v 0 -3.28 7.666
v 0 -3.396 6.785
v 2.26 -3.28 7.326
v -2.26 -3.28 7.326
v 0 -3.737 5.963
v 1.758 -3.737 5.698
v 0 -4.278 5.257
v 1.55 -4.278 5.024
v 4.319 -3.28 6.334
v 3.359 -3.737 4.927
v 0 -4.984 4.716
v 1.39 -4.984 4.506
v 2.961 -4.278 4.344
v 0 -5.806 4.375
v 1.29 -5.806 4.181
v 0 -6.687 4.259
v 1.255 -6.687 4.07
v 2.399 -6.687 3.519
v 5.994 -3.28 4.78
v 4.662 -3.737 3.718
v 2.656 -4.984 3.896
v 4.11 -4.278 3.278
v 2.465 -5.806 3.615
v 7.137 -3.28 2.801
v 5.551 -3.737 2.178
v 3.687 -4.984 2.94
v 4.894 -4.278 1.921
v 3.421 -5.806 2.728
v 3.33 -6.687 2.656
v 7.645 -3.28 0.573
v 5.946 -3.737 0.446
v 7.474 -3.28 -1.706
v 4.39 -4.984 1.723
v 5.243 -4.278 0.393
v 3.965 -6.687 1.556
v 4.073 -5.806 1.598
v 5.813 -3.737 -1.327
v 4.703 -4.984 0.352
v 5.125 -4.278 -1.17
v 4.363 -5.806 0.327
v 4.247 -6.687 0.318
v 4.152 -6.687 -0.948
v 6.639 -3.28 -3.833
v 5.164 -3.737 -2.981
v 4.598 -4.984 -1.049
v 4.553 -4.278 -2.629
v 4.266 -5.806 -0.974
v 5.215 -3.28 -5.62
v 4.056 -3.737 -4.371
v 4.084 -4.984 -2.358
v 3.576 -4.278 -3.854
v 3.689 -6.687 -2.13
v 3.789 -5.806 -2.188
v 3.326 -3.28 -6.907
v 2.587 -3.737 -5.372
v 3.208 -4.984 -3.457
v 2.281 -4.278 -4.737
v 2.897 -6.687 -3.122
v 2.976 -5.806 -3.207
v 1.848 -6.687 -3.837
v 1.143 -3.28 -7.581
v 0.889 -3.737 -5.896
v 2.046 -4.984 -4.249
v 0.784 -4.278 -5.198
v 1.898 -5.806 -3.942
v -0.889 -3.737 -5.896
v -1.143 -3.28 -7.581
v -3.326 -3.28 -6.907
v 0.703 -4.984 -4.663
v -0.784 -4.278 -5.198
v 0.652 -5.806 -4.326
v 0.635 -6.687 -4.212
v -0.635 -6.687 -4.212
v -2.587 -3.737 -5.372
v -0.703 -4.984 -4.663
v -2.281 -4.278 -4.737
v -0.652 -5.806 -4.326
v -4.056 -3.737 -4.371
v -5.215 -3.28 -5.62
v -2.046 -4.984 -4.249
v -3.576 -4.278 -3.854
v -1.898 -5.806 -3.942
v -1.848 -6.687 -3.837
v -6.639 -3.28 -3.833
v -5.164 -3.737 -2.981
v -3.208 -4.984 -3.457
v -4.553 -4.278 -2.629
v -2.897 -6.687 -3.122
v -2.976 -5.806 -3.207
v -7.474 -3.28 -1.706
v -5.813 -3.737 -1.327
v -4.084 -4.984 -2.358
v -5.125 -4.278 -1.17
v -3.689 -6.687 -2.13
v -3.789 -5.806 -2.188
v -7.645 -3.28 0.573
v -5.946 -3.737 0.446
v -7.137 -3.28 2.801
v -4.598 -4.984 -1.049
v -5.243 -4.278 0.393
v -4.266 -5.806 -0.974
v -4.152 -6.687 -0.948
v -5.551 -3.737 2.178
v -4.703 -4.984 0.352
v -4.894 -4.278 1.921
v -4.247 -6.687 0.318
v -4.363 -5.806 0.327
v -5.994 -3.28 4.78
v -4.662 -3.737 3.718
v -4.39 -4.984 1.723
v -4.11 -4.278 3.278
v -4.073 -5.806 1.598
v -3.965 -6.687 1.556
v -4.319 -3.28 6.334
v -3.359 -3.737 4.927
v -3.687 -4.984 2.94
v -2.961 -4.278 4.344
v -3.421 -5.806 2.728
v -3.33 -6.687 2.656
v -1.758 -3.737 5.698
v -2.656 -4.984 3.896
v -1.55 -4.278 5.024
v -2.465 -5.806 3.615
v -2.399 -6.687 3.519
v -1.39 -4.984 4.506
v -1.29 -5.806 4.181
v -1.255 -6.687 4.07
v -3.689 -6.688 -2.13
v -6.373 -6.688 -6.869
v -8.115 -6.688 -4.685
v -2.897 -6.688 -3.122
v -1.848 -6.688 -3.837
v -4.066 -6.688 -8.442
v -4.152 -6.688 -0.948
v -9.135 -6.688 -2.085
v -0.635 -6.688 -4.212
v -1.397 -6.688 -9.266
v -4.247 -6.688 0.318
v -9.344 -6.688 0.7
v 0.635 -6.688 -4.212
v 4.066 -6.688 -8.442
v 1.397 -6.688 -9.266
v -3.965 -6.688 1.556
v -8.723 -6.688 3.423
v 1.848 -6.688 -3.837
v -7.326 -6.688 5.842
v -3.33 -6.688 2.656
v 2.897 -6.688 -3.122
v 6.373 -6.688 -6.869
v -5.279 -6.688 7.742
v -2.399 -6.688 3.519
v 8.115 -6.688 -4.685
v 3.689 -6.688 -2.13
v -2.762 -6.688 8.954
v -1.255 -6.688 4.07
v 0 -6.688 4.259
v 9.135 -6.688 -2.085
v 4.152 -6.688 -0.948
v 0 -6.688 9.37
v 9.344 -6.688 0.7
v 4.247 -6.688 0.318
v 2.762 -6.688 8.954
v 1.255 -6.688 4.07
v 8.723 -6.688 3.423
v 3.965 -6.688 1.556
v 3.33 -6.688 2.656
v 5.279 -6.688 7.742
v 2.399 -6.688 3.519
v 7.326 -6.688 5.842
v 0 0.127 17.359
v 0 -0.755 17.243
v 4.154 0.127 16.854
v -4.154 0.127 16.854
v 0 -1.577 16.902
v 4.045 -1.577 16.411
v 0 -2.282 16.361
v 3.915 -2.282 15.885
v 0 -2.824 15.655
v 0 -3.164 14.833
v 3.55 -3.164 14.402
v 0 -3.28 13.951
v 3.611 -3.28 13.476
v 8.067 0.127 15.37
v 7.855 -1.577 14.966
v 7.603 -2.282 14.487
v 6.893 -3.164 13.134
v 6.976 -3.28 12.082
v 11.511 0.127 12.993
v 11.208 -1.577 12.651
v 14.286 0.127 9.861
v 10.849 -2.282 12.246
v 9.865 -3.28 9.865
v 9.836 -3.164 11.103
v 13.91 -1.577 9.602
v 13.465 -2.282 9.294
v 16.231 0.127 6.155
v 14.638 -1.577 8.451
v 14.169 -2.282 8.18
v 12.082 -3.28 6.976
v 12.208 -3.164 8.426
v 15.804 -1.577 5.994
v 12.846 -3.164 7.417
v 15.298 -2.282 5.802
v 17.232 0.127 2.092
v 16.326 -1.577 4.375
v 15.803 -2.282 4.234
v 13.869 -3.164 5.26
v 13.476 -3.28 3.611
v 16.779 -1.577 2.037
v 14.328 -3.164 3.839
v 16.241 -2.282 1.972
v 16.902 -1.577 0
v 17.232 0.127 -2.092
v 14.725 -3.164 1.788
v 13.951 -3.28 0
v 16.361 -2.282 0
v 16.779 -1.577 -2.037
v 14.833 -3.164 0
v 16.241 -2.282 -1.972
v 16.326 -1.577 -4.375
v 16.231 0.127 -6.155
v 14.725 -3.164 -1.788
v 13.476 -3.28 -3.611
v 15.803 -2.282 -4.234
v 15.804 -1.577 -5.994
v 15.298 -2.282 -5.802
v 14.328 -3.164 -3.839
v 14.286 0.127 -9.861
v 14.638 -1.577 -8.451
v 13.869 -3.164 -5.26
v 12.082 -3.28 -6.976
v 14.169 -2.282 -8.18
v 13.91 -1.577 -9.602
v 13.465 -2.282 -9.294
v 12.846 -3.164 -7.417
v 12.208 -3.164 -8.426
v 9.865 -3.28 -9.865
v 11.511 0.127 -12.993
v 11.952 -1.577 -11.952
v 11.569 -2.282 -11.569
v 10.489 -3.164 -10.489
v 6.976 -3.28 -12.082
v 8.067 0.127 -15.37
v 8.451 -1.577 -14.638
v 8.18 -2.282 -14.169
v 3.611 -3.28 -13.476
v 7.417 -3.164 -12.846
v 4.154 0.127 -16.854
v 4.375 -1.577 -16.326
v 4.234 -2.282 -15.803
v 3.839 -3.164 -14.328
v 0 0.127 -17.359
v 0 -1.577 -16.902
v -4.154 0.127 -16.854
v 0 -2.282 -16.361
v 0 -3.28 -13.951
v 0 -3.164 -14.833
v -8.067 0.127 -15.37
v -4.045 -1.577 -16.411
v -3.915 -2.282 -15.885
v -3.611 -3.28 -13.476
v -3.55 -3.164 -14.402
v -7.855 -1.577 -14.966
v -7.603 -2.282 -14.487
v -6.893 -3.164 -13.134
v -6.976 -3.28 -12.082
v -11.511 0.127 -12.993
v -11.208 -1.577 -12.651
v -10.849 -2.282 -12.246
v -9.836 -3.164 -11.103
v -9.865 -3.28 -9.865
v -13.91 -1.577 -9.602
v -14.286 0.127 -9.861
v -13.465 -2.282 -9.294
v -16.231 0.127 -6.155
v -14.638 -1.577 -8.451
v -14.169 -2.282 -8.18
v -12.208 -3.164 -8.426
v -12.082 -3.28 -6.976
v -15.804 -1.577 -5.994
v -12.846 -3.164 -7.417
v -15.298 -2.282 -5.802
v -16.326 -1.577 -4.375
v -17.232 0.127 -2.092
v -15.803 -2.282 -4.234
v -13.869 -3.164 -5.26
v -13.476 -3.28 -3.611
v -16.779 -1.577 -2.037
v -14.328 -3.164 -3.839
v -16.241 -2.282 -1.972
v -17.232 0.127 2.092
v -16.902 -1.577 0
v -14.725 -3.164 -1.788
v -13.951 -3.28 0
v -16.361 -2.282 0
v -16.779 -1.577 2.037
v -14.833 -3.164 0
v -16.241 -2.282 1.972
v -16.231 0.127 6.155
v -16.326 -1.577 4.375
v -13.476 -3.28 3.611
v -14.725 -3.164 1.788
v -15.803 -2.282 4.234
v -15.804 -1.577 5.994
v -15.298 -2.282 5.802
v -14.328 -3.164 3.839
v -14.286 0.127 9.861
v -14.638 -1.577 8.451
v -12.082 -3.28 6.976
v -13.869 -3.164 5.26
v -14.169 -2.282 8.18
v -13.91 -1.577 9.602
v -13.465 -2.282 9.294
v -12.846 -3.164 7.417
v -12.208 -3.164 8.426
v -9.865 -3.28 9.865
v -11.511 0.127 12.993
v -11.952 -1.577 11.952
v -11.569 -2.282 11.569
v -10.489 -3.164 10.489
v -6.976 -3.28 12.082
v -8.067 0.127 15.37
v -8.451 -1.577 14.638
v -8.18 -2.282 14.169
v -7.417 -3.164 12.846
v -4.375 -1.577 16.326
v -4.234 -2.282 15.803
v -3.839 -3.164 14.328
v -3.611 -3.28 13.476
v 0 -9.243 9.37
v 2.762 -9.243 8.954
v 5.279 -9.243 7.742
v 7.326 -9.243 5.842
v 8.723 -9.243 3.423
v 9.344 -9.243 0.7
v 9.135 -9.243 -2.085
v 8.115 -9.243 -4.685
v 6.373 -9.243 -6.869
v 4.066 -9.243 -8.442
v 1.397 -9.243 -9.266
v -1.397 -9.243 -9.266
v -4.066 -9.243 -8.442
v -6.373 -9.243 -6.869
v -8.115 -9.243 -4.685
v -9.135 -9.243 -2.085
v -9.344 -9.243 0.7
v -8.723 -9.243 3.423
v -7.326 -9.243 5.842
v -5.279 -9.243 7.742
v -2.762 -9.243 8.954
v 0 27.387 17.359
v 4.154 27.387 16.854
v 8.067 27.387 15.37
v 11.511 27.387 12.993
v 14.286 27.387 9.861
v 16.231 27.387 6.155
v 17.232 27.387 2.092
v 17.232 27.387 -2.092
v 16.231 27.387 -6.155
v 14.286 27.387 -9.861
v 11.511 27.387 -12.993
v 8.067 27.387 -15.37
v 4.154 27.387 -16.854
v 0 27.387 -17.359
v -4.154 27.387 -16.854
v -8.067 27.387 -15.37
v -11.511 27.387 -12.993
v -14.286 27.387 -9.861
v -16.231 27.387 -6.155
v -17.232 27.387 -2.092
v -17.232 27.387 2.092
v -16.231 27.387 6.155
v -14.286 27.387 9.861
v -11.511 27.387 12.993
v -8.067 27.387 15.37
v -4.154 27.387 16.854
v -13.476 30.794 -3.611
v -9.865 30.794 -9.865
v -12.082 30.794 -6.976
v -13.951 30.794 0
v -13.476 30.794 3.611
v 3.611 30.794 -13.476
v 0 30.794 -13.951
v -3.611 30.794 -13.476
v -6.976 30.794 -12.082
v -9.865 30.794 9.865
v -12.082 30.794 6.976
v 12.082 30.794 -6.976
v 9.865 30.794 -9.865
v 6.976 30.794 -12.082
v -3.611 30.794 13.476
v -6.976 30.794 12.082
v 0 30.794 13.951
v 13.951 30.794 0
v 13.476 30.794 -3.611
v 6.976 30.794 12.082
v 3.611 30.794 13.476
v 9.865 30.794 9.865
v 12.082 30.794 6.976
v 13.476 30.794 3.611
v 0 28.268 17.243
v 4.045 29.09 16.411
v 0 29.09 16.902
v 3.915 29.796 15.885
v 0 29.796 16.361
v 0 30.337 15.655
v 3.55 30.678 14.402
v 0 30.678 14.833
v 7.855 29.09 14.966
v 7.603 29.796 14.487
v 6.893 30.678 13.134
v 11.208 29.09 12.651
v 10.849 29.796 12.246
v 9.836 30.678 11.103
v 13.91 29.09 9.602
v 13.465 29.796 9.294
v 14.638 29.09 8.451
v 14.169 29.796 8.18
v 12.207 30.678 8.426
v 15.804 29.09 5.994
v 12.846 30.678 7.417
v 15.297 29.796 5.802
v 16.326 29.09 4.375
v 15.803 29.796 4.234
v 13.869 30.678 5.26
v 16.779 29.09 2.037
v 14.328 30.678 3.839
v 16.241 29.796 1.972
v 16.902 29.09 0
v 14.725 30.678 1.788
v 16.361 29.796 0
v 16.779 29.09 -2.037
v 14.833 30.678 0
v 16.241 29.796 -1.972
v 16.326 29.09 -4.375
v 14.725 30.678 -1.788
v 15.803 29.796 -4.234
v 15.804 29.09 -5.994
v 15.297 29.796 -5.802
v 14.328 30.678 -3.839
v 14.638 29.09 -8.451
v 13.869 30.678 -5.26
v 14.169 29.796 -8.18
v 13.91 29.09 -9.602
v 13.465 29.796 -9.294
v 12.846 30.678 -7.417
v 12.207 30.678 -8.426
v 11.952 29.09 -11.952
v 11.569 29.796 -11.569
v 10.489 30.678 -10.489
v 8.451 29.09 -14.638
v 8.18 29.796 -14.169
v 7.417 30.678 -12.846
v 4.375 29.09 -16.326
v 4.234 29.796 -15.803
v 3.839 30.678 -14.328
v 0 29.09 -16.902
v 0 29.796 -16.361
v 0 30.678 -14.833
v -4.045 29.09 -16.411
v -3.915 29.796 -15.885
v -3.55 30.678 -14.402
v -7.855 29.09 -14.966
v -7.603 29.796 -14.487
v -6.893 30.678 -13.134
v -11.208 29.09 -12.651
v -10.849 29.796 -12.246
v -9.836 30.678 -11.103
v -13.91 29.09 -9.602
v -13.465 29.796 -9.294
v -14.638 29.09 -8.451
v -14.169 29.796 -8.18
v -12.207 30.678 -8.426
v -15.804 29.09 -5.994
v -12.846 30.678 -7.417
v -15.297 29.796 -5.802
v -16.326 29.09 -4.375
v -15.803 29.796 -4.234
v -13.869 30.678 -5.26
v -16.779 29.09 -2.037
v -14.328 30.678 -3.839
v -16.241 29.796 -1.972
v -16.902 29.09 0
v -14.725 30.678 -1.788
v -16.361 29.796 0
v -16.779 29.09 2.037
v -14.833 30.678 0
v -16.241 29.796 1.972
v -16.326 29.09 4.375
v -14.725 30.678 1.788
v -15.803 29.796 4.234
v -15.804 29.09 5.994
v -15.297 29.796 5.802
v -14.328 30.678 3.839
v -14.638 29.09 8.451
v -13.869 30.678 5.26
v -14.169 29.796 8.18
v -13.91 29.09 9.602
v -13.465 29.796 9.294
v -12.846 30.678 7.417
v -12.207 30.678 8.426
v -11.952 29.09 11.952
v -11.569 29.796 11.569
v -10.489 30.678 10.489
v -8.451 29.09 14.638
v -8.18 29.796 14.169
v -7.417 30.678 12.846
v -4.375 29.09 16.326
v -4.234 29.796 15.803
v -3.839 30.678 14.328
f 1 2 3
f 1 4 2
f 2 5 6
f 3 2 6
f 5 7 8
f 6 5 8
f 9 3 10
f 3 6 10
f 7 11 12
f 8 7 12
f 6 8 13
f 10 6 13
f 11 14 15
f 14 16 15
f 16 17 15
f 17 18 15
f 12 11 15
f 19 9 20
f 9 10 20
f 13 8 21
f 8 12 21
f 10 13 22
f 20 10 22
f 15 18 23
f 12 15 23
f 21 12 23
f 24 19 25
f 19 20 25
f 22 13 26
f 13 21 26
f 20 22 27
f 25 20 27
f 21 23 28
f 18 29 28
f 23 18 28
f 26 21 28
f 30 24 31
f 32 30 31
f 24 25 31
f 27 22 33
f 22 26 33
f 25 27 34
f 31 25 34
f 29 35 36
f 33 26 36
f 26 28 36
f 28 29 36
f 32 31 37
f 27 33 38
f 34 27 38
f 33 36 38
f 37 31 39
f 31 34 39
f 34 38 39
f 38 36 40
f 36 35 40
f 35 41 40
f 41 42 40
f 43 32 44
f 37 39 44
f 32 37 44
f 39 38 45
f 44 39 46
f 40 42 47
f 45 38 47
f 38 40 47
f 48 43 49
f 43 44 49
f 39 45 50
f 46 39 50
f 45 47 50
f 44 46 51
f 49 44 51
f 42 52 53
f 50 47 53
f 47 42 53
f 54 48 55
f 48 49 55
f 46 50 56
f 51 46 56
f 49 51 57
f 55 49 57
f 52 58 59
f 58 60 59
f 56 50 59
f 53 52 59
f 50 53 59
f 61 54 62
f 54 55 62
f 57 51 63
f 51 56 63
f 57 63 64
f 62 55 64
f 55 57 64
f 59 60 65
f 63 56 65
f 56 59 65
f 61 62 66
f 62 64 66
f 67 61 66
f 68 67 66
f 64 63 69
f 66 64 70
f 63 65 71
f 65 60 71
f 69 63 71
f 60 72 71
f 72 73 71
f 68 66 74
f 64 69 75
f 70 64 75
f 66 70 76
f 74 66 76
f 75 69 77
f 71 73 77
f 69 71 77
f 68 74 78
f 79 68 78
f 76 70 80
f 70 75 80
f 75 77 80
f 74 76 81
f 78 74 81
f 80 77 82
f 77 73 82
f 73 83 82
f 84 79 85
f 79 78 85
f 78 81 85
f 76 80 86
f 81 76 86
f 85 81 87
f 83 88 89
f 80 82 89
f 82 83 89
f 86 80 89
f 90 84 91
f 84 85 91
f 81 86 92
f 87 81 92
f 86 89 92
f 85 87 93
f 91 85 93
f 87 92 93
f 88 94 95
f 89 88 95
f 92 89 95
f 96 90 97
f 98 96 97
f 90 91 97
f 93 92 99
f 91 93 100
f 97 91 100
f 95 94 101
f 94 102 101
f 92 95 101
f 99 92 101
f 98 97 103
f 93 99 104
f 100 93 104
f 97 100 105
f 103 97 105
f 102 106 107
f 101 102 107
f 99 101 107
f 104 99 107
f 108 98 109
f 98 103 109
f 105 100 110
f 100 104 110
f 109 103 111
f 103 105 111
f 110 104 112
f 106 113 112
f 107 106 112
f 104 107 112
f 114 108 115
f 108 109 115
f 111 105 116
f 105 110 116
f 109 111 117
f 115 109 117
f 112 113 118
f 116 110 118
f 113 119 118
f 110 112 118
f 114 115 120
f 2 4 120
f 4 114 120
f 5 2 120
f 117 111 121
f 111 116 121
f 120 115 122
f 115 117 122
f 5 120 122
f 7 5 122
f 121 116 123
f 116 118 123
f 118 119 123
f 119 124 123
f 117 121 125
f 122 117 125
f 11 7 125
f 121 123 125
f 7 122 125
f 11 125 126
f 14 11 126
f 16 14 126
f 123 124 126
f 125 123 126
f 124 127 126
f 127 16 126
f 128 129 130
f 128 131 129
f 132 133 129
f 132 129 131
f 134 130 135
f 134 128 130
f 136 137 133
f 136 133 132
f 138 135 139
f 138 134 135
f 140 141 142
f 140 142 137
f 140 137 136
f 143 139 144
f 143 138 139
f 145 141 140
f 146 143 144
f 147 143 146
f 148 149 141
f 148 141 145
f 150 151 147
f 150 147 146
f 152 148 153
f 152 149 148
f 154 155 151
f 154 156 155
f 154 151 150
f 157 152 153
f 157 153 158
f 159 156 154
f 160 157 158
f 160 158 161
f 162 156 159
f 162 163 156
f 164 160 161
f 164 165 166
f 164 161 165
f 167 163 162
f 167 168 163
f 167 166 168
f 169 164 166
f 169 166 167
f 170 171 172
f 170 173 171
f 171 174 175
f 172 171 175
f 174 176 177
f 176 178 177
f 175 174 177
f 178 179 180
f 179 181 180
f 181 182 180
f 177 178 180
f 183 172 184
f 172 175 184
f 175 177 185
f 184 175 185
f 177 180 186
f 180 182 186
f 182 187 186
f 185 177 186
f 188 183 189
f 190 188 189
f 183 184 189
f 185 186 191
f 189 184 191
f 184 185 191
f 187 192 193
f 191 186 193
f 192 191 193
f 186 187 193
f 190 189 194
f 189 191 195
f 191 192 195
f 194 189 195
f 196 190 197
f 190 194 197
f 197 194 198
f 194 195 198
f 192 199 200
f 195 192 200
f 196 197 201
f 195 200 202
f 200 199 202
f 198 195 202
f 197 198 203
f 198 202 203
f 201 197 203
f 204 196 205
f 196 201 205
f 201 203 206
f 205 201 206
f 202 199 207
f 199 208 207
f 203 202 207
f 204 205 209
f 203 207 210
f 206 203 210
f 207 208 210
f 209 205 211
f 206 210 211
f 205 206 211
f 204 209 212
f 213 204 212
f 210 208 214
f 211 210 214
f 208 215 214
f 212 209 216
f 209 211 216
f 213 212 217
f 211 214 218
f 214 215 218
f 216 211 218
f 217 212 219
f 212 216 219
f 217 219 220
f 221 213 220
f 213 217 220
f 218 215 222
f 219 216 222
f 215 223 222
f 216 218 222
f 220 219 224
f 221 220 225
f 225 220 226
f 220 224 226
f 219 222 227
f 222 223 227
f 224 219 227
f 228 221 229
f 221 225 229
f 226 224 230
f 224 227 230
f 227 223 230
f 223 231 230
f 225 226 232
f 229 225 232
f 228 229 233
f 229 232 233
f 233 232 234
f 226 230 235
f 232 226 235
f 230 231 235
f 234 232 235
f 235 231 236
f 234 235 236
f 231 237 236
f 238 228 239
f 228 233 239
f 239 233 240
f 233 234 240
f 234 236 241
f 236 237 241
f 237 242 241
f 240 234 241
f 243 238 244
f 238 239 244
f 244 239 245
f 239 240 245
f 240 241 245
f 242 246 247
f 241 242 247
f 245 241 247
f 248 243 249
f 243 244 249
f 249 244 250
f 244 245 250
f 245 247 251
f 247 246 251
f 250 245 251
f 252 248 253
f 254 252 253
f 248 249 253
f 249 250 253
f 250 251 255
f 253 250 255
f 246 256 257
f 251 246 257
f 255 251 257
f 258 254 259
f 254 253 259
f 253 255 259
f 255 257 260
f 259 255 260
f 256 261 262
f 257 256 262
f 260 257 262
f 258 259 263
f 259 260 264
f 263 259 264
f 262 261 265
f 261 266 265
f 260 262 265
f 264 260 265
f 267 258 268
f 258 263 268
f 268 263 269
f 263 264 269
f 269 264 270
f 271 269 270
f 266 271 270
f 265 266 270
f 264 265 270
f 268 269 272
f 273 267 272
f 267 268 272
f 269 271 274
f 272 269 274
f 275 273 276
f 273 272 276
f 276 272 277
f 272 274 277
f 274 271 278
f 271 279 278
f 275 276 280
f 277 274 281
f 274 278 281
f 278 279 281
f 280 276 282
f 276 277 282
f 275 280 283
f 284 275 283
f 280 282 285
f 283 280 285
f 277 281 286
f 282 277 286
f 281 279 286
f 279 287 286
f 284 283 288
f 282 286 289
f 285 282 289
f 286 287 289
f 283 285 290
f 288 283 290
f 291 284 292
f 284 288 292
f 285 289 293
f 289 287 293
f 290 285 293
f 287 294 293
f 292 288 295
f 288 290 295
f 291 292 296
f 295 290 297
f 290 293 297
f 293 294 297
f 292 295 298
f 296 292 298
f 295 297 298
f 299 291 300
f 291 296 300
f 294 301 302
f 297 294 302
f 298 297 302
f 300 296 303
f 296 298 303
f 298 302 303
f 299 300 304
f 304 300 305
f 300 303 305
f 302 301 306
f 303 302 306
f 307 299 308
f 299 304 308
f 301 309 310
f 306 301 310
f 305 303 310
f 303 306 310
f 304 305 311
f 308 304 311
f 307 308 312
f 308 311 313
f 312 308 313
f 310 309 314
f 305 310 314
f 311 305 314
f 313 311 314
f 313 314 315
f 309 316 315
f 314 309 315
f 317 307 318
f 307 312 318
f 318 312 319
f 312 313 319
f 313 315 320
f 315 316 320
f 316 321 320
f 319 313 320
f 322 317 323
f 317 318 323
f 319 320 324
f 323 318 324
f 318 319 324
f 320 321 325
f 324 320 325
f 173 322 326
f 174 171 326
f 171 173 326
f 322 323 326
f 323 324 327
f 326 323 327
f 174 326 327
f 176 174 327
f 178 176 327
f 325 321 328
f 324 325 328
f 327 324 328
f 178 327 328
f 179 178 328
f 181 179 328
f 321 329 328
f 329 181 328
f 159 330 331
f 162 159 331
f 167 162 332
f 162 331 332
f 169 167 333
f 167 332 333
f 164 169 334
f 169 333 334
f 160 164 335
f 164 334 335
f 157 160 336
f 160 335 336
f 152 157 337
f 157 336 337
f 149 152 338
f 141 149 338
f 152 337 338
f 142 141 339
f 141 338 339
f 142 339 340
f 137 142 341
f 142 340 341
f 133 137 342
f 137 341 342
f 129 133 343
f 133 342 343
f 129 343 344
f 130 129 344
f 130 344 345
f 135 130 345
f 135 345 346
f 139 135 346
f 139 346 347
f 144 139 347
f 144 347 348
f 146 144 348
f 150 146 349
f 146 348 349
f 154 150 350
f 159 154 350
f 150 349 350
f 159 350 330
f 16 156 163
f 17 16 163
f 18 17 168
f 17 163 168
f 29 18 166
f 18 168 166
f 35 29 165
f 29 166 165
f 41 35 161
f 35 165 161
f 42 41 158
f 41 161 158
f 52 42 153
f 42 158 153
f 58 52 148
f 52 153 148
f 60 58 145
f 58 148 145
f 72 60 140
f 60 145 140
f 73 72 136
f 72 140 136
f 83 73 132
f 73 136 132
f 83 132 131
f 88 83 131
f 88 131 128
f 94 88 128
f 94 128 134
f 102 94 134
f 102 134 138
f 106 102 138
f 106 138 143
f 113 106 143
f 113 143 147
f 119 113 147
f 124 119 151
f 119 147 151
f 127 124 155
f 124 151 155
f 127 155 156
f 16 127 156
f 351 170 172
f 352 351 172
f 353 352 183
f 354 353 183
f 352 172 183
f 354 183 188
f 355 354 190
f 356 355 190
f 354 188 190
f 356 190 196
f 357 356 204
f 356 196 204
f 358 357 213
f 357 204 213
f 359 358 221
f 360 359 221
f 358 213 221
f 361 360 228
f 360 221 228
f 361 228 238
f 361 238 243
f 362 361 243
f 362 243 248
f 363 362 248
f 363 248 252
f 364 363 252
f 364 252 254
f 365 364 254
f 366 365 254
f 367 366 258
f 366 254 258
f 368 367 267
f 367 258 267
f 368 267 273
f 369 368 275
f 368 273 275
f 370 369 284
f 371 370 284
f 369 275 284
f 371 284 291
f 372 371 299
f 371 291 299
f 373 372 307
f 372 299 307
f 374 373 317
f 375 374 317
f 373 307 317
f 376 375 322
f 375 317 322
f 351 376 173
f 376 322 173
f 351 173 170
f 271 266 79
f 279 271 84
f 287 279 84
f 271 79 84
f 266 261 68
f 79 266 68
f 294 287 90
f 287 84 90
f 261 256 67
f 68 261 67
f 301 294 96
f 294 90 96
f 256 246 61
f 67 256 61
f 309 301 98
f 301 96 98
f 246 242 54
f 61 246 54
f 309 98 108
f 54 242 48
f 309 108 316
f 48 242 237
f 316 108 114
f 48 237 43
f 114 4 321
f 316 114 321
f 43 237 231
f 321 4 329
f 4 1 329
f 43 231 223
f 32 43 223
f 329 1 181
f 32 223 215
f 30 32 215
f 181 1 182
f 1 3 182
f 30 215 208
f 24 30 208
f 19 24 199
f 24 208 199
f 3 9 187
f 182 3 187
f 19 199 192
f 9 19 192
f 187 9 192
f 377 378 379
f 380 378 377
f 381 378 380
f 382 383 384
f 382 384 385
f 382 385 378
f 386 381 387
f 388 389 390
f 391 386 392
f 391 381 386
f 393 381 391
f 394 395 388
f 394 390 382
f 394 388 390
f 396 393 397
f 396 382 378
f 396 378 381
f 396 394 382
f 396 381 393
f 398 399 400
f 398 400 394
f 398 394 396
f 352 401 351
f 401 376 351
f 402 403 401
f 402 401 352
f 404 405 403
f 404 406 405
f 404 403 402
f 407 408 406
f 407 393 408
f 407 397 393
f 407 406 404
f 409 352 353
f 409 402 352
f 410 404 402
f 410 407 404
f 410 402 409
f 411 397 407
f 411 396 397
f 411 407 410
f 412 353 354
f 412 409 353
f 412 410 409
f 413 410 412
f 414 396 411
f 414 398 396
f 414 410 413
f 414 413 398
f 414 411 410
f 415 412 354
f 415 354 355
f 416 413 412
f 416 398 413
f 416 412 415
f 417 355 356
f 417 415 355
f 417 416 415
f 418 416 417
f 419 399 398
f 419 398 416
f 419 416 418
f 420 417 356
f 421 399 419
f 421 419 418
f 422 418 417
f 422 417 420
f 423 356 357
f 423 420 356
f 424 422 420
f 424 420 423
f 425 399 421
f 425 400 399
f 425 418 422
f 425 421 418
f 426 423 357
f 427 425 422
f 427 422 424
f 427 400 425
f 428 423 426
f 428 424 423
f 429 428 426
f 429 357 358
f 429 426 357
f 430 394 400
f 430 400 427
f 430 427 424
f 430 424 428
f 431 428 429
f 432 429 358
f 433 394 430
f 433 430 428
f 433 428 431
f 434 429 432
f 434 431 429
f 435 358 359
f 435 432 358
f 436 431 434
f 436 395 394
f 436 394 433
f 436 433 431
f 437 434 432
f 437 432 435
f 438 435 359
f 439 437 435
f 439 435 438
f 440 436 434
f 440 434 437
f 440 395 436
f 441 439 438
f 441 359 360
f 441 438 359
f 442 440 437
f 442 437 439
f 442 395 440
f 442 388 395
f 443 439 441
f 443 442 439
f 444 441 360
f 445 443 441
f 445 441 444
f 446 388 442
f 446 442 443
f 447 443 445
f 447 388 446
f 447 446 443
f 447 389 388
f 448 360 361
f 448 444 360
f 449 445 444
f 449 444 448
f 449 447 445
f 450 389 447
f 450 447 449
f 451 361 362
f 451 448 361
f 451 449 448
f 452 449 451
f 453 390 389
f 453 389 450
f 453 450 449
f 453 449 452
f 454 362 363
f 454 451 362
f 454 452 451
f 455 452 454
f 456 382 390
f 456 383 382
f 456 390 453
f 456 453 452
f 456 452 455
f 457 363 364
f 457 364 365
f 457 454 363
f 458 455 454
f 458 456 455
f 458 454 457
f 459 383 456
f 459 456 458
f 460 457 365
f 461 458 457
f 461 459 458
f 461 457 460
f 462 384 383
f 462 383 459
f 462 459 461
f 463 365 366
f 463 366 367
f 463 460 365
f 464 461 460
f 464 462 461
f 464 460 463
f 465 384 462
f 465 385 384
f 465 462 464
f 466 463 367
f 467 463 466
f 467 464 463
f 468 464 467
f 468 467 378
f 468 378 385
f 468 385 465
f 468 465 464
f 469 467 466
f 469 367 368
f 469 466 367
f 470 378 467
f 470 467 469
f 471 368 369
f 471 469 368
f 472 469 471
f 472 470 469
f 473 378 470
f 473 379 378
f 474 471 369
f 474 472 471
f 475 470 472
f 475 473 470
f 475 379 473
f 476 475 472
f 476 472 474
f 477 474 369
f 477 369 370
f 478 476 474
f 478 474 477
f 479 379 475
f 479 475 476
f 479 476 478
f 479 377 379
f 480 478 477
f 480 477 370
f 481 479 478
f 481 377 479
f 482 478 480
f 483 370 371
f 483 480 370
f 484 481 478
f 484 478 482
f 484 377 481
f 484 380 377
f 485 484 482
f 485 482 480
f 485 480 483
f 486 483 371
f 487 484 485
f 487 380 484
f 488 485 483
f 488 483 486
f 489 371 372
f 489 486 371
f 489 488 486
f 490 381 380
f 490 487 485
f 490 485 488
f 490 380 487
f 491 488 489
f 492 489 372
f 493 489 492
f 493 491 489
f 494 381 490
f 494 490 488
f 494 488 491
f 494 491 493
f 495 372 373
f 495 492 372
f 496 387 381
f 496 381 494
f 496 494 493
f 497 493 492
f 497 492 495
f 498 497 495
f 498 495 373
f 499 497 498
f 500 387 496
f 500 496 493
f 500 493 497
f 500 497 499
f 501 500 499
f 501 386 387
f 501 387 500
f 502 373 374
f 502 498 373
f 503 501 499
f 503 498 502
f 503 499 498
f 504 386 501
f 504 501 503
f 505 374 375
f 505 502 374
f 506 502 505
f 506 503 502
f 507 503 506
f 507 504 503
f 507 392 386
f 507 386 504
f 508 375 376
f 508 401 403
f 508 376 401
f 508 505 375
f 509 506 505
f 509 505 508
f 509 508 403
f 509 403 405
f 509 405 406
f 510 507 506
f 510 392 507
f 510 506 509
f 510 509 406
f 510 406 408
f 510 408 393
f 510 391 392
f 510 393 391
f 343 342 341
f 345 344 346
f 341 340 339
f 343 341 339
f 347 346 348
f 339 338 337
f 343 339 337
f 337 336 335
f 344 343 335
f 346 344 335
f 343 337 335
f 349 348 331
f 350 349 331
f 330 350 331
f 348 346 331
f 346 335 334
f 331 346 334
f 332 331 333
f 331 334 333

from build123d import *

# Parameters (mm, degrees)
SKETCH_1_R      = 5.5
EXTRUDE_1_DEPTH = 1.5
SKETCH_2_R      = 2.5
EXTRUDE_2_DEPTH = 2
SKETCH_3_R      = 10.188778254
EXTRUDE_3_DEPTH = 20
FILLET_2_R      = 2
FILLET_3_R      = 2
SCALE_1_SCALE   = 1.703703703


with BuildPart() as part:
    # 草图1 → 凸台-拉伸1 (new body)
    with BuildSketch(Plane(origin=(0, 0, 0), x_dir=(1, 0, 0), z_dir=(0, 1, 0))):
        with Locations(Location((0, 0, 0), (0, 0, 270))):
            Circle(SKETCH_1_R)
    extrude(amount=EXTRUDE_1_DEPTH)

    # 草图2 → 凸台-拉伸2 (add)
    with BuildSketch(Plane(origin=(0, 1.5, 0), x_dir=(1, 0, 0), z_dir=(0, 1, 0))):
        with Locations(Location((0, 0, 0), (0, 0, 270))):
            Circle(SKETCH_2_R)
    extrude(amount=EXTRUDE_2_DEPTH)

    # 草图3 → 凸台-拉伸3 (add)
    with BuildSketch(Plane(origin=(0, 3.5, 0), x_dir=(1, 0, 0), z_dir=(0, 1, 0))):
        with Locations(Location((0, 0, 0), (0, 0, 270))):
            Circle(SKETCH_3_R)
    extrude(amount=EXTRUDE_3_DEPTH)

    # 圆角2
    fillet_2_edges = [part.edges().sort_by_distance(p)[0] for p in [
        (0, 23.5, -10.188778254),
    ]]
    fillet(fillet_2_edges, radius=FILLET_2_R)

    # 圆角3
    fillet_3_edges = [part.edges().sort_by_distance(p)[0] for p in [
        (0, 3.5, -2.5),
        (0, 3.5, -10.188778254),
    ]]
    fillet(fillet_3_edges, radius=FILLET_3_R - 0.0001)  # a hair under: the kernel refuses the full size


with BuildPart() as part_1:
    # 缩放比例1: scaled about (0, 13.134921616, 0)
    add(part.part.scale(SCALE_1_SCALE).moved(Location((0, -9.243092979, 0))))


solid = part_1.part
